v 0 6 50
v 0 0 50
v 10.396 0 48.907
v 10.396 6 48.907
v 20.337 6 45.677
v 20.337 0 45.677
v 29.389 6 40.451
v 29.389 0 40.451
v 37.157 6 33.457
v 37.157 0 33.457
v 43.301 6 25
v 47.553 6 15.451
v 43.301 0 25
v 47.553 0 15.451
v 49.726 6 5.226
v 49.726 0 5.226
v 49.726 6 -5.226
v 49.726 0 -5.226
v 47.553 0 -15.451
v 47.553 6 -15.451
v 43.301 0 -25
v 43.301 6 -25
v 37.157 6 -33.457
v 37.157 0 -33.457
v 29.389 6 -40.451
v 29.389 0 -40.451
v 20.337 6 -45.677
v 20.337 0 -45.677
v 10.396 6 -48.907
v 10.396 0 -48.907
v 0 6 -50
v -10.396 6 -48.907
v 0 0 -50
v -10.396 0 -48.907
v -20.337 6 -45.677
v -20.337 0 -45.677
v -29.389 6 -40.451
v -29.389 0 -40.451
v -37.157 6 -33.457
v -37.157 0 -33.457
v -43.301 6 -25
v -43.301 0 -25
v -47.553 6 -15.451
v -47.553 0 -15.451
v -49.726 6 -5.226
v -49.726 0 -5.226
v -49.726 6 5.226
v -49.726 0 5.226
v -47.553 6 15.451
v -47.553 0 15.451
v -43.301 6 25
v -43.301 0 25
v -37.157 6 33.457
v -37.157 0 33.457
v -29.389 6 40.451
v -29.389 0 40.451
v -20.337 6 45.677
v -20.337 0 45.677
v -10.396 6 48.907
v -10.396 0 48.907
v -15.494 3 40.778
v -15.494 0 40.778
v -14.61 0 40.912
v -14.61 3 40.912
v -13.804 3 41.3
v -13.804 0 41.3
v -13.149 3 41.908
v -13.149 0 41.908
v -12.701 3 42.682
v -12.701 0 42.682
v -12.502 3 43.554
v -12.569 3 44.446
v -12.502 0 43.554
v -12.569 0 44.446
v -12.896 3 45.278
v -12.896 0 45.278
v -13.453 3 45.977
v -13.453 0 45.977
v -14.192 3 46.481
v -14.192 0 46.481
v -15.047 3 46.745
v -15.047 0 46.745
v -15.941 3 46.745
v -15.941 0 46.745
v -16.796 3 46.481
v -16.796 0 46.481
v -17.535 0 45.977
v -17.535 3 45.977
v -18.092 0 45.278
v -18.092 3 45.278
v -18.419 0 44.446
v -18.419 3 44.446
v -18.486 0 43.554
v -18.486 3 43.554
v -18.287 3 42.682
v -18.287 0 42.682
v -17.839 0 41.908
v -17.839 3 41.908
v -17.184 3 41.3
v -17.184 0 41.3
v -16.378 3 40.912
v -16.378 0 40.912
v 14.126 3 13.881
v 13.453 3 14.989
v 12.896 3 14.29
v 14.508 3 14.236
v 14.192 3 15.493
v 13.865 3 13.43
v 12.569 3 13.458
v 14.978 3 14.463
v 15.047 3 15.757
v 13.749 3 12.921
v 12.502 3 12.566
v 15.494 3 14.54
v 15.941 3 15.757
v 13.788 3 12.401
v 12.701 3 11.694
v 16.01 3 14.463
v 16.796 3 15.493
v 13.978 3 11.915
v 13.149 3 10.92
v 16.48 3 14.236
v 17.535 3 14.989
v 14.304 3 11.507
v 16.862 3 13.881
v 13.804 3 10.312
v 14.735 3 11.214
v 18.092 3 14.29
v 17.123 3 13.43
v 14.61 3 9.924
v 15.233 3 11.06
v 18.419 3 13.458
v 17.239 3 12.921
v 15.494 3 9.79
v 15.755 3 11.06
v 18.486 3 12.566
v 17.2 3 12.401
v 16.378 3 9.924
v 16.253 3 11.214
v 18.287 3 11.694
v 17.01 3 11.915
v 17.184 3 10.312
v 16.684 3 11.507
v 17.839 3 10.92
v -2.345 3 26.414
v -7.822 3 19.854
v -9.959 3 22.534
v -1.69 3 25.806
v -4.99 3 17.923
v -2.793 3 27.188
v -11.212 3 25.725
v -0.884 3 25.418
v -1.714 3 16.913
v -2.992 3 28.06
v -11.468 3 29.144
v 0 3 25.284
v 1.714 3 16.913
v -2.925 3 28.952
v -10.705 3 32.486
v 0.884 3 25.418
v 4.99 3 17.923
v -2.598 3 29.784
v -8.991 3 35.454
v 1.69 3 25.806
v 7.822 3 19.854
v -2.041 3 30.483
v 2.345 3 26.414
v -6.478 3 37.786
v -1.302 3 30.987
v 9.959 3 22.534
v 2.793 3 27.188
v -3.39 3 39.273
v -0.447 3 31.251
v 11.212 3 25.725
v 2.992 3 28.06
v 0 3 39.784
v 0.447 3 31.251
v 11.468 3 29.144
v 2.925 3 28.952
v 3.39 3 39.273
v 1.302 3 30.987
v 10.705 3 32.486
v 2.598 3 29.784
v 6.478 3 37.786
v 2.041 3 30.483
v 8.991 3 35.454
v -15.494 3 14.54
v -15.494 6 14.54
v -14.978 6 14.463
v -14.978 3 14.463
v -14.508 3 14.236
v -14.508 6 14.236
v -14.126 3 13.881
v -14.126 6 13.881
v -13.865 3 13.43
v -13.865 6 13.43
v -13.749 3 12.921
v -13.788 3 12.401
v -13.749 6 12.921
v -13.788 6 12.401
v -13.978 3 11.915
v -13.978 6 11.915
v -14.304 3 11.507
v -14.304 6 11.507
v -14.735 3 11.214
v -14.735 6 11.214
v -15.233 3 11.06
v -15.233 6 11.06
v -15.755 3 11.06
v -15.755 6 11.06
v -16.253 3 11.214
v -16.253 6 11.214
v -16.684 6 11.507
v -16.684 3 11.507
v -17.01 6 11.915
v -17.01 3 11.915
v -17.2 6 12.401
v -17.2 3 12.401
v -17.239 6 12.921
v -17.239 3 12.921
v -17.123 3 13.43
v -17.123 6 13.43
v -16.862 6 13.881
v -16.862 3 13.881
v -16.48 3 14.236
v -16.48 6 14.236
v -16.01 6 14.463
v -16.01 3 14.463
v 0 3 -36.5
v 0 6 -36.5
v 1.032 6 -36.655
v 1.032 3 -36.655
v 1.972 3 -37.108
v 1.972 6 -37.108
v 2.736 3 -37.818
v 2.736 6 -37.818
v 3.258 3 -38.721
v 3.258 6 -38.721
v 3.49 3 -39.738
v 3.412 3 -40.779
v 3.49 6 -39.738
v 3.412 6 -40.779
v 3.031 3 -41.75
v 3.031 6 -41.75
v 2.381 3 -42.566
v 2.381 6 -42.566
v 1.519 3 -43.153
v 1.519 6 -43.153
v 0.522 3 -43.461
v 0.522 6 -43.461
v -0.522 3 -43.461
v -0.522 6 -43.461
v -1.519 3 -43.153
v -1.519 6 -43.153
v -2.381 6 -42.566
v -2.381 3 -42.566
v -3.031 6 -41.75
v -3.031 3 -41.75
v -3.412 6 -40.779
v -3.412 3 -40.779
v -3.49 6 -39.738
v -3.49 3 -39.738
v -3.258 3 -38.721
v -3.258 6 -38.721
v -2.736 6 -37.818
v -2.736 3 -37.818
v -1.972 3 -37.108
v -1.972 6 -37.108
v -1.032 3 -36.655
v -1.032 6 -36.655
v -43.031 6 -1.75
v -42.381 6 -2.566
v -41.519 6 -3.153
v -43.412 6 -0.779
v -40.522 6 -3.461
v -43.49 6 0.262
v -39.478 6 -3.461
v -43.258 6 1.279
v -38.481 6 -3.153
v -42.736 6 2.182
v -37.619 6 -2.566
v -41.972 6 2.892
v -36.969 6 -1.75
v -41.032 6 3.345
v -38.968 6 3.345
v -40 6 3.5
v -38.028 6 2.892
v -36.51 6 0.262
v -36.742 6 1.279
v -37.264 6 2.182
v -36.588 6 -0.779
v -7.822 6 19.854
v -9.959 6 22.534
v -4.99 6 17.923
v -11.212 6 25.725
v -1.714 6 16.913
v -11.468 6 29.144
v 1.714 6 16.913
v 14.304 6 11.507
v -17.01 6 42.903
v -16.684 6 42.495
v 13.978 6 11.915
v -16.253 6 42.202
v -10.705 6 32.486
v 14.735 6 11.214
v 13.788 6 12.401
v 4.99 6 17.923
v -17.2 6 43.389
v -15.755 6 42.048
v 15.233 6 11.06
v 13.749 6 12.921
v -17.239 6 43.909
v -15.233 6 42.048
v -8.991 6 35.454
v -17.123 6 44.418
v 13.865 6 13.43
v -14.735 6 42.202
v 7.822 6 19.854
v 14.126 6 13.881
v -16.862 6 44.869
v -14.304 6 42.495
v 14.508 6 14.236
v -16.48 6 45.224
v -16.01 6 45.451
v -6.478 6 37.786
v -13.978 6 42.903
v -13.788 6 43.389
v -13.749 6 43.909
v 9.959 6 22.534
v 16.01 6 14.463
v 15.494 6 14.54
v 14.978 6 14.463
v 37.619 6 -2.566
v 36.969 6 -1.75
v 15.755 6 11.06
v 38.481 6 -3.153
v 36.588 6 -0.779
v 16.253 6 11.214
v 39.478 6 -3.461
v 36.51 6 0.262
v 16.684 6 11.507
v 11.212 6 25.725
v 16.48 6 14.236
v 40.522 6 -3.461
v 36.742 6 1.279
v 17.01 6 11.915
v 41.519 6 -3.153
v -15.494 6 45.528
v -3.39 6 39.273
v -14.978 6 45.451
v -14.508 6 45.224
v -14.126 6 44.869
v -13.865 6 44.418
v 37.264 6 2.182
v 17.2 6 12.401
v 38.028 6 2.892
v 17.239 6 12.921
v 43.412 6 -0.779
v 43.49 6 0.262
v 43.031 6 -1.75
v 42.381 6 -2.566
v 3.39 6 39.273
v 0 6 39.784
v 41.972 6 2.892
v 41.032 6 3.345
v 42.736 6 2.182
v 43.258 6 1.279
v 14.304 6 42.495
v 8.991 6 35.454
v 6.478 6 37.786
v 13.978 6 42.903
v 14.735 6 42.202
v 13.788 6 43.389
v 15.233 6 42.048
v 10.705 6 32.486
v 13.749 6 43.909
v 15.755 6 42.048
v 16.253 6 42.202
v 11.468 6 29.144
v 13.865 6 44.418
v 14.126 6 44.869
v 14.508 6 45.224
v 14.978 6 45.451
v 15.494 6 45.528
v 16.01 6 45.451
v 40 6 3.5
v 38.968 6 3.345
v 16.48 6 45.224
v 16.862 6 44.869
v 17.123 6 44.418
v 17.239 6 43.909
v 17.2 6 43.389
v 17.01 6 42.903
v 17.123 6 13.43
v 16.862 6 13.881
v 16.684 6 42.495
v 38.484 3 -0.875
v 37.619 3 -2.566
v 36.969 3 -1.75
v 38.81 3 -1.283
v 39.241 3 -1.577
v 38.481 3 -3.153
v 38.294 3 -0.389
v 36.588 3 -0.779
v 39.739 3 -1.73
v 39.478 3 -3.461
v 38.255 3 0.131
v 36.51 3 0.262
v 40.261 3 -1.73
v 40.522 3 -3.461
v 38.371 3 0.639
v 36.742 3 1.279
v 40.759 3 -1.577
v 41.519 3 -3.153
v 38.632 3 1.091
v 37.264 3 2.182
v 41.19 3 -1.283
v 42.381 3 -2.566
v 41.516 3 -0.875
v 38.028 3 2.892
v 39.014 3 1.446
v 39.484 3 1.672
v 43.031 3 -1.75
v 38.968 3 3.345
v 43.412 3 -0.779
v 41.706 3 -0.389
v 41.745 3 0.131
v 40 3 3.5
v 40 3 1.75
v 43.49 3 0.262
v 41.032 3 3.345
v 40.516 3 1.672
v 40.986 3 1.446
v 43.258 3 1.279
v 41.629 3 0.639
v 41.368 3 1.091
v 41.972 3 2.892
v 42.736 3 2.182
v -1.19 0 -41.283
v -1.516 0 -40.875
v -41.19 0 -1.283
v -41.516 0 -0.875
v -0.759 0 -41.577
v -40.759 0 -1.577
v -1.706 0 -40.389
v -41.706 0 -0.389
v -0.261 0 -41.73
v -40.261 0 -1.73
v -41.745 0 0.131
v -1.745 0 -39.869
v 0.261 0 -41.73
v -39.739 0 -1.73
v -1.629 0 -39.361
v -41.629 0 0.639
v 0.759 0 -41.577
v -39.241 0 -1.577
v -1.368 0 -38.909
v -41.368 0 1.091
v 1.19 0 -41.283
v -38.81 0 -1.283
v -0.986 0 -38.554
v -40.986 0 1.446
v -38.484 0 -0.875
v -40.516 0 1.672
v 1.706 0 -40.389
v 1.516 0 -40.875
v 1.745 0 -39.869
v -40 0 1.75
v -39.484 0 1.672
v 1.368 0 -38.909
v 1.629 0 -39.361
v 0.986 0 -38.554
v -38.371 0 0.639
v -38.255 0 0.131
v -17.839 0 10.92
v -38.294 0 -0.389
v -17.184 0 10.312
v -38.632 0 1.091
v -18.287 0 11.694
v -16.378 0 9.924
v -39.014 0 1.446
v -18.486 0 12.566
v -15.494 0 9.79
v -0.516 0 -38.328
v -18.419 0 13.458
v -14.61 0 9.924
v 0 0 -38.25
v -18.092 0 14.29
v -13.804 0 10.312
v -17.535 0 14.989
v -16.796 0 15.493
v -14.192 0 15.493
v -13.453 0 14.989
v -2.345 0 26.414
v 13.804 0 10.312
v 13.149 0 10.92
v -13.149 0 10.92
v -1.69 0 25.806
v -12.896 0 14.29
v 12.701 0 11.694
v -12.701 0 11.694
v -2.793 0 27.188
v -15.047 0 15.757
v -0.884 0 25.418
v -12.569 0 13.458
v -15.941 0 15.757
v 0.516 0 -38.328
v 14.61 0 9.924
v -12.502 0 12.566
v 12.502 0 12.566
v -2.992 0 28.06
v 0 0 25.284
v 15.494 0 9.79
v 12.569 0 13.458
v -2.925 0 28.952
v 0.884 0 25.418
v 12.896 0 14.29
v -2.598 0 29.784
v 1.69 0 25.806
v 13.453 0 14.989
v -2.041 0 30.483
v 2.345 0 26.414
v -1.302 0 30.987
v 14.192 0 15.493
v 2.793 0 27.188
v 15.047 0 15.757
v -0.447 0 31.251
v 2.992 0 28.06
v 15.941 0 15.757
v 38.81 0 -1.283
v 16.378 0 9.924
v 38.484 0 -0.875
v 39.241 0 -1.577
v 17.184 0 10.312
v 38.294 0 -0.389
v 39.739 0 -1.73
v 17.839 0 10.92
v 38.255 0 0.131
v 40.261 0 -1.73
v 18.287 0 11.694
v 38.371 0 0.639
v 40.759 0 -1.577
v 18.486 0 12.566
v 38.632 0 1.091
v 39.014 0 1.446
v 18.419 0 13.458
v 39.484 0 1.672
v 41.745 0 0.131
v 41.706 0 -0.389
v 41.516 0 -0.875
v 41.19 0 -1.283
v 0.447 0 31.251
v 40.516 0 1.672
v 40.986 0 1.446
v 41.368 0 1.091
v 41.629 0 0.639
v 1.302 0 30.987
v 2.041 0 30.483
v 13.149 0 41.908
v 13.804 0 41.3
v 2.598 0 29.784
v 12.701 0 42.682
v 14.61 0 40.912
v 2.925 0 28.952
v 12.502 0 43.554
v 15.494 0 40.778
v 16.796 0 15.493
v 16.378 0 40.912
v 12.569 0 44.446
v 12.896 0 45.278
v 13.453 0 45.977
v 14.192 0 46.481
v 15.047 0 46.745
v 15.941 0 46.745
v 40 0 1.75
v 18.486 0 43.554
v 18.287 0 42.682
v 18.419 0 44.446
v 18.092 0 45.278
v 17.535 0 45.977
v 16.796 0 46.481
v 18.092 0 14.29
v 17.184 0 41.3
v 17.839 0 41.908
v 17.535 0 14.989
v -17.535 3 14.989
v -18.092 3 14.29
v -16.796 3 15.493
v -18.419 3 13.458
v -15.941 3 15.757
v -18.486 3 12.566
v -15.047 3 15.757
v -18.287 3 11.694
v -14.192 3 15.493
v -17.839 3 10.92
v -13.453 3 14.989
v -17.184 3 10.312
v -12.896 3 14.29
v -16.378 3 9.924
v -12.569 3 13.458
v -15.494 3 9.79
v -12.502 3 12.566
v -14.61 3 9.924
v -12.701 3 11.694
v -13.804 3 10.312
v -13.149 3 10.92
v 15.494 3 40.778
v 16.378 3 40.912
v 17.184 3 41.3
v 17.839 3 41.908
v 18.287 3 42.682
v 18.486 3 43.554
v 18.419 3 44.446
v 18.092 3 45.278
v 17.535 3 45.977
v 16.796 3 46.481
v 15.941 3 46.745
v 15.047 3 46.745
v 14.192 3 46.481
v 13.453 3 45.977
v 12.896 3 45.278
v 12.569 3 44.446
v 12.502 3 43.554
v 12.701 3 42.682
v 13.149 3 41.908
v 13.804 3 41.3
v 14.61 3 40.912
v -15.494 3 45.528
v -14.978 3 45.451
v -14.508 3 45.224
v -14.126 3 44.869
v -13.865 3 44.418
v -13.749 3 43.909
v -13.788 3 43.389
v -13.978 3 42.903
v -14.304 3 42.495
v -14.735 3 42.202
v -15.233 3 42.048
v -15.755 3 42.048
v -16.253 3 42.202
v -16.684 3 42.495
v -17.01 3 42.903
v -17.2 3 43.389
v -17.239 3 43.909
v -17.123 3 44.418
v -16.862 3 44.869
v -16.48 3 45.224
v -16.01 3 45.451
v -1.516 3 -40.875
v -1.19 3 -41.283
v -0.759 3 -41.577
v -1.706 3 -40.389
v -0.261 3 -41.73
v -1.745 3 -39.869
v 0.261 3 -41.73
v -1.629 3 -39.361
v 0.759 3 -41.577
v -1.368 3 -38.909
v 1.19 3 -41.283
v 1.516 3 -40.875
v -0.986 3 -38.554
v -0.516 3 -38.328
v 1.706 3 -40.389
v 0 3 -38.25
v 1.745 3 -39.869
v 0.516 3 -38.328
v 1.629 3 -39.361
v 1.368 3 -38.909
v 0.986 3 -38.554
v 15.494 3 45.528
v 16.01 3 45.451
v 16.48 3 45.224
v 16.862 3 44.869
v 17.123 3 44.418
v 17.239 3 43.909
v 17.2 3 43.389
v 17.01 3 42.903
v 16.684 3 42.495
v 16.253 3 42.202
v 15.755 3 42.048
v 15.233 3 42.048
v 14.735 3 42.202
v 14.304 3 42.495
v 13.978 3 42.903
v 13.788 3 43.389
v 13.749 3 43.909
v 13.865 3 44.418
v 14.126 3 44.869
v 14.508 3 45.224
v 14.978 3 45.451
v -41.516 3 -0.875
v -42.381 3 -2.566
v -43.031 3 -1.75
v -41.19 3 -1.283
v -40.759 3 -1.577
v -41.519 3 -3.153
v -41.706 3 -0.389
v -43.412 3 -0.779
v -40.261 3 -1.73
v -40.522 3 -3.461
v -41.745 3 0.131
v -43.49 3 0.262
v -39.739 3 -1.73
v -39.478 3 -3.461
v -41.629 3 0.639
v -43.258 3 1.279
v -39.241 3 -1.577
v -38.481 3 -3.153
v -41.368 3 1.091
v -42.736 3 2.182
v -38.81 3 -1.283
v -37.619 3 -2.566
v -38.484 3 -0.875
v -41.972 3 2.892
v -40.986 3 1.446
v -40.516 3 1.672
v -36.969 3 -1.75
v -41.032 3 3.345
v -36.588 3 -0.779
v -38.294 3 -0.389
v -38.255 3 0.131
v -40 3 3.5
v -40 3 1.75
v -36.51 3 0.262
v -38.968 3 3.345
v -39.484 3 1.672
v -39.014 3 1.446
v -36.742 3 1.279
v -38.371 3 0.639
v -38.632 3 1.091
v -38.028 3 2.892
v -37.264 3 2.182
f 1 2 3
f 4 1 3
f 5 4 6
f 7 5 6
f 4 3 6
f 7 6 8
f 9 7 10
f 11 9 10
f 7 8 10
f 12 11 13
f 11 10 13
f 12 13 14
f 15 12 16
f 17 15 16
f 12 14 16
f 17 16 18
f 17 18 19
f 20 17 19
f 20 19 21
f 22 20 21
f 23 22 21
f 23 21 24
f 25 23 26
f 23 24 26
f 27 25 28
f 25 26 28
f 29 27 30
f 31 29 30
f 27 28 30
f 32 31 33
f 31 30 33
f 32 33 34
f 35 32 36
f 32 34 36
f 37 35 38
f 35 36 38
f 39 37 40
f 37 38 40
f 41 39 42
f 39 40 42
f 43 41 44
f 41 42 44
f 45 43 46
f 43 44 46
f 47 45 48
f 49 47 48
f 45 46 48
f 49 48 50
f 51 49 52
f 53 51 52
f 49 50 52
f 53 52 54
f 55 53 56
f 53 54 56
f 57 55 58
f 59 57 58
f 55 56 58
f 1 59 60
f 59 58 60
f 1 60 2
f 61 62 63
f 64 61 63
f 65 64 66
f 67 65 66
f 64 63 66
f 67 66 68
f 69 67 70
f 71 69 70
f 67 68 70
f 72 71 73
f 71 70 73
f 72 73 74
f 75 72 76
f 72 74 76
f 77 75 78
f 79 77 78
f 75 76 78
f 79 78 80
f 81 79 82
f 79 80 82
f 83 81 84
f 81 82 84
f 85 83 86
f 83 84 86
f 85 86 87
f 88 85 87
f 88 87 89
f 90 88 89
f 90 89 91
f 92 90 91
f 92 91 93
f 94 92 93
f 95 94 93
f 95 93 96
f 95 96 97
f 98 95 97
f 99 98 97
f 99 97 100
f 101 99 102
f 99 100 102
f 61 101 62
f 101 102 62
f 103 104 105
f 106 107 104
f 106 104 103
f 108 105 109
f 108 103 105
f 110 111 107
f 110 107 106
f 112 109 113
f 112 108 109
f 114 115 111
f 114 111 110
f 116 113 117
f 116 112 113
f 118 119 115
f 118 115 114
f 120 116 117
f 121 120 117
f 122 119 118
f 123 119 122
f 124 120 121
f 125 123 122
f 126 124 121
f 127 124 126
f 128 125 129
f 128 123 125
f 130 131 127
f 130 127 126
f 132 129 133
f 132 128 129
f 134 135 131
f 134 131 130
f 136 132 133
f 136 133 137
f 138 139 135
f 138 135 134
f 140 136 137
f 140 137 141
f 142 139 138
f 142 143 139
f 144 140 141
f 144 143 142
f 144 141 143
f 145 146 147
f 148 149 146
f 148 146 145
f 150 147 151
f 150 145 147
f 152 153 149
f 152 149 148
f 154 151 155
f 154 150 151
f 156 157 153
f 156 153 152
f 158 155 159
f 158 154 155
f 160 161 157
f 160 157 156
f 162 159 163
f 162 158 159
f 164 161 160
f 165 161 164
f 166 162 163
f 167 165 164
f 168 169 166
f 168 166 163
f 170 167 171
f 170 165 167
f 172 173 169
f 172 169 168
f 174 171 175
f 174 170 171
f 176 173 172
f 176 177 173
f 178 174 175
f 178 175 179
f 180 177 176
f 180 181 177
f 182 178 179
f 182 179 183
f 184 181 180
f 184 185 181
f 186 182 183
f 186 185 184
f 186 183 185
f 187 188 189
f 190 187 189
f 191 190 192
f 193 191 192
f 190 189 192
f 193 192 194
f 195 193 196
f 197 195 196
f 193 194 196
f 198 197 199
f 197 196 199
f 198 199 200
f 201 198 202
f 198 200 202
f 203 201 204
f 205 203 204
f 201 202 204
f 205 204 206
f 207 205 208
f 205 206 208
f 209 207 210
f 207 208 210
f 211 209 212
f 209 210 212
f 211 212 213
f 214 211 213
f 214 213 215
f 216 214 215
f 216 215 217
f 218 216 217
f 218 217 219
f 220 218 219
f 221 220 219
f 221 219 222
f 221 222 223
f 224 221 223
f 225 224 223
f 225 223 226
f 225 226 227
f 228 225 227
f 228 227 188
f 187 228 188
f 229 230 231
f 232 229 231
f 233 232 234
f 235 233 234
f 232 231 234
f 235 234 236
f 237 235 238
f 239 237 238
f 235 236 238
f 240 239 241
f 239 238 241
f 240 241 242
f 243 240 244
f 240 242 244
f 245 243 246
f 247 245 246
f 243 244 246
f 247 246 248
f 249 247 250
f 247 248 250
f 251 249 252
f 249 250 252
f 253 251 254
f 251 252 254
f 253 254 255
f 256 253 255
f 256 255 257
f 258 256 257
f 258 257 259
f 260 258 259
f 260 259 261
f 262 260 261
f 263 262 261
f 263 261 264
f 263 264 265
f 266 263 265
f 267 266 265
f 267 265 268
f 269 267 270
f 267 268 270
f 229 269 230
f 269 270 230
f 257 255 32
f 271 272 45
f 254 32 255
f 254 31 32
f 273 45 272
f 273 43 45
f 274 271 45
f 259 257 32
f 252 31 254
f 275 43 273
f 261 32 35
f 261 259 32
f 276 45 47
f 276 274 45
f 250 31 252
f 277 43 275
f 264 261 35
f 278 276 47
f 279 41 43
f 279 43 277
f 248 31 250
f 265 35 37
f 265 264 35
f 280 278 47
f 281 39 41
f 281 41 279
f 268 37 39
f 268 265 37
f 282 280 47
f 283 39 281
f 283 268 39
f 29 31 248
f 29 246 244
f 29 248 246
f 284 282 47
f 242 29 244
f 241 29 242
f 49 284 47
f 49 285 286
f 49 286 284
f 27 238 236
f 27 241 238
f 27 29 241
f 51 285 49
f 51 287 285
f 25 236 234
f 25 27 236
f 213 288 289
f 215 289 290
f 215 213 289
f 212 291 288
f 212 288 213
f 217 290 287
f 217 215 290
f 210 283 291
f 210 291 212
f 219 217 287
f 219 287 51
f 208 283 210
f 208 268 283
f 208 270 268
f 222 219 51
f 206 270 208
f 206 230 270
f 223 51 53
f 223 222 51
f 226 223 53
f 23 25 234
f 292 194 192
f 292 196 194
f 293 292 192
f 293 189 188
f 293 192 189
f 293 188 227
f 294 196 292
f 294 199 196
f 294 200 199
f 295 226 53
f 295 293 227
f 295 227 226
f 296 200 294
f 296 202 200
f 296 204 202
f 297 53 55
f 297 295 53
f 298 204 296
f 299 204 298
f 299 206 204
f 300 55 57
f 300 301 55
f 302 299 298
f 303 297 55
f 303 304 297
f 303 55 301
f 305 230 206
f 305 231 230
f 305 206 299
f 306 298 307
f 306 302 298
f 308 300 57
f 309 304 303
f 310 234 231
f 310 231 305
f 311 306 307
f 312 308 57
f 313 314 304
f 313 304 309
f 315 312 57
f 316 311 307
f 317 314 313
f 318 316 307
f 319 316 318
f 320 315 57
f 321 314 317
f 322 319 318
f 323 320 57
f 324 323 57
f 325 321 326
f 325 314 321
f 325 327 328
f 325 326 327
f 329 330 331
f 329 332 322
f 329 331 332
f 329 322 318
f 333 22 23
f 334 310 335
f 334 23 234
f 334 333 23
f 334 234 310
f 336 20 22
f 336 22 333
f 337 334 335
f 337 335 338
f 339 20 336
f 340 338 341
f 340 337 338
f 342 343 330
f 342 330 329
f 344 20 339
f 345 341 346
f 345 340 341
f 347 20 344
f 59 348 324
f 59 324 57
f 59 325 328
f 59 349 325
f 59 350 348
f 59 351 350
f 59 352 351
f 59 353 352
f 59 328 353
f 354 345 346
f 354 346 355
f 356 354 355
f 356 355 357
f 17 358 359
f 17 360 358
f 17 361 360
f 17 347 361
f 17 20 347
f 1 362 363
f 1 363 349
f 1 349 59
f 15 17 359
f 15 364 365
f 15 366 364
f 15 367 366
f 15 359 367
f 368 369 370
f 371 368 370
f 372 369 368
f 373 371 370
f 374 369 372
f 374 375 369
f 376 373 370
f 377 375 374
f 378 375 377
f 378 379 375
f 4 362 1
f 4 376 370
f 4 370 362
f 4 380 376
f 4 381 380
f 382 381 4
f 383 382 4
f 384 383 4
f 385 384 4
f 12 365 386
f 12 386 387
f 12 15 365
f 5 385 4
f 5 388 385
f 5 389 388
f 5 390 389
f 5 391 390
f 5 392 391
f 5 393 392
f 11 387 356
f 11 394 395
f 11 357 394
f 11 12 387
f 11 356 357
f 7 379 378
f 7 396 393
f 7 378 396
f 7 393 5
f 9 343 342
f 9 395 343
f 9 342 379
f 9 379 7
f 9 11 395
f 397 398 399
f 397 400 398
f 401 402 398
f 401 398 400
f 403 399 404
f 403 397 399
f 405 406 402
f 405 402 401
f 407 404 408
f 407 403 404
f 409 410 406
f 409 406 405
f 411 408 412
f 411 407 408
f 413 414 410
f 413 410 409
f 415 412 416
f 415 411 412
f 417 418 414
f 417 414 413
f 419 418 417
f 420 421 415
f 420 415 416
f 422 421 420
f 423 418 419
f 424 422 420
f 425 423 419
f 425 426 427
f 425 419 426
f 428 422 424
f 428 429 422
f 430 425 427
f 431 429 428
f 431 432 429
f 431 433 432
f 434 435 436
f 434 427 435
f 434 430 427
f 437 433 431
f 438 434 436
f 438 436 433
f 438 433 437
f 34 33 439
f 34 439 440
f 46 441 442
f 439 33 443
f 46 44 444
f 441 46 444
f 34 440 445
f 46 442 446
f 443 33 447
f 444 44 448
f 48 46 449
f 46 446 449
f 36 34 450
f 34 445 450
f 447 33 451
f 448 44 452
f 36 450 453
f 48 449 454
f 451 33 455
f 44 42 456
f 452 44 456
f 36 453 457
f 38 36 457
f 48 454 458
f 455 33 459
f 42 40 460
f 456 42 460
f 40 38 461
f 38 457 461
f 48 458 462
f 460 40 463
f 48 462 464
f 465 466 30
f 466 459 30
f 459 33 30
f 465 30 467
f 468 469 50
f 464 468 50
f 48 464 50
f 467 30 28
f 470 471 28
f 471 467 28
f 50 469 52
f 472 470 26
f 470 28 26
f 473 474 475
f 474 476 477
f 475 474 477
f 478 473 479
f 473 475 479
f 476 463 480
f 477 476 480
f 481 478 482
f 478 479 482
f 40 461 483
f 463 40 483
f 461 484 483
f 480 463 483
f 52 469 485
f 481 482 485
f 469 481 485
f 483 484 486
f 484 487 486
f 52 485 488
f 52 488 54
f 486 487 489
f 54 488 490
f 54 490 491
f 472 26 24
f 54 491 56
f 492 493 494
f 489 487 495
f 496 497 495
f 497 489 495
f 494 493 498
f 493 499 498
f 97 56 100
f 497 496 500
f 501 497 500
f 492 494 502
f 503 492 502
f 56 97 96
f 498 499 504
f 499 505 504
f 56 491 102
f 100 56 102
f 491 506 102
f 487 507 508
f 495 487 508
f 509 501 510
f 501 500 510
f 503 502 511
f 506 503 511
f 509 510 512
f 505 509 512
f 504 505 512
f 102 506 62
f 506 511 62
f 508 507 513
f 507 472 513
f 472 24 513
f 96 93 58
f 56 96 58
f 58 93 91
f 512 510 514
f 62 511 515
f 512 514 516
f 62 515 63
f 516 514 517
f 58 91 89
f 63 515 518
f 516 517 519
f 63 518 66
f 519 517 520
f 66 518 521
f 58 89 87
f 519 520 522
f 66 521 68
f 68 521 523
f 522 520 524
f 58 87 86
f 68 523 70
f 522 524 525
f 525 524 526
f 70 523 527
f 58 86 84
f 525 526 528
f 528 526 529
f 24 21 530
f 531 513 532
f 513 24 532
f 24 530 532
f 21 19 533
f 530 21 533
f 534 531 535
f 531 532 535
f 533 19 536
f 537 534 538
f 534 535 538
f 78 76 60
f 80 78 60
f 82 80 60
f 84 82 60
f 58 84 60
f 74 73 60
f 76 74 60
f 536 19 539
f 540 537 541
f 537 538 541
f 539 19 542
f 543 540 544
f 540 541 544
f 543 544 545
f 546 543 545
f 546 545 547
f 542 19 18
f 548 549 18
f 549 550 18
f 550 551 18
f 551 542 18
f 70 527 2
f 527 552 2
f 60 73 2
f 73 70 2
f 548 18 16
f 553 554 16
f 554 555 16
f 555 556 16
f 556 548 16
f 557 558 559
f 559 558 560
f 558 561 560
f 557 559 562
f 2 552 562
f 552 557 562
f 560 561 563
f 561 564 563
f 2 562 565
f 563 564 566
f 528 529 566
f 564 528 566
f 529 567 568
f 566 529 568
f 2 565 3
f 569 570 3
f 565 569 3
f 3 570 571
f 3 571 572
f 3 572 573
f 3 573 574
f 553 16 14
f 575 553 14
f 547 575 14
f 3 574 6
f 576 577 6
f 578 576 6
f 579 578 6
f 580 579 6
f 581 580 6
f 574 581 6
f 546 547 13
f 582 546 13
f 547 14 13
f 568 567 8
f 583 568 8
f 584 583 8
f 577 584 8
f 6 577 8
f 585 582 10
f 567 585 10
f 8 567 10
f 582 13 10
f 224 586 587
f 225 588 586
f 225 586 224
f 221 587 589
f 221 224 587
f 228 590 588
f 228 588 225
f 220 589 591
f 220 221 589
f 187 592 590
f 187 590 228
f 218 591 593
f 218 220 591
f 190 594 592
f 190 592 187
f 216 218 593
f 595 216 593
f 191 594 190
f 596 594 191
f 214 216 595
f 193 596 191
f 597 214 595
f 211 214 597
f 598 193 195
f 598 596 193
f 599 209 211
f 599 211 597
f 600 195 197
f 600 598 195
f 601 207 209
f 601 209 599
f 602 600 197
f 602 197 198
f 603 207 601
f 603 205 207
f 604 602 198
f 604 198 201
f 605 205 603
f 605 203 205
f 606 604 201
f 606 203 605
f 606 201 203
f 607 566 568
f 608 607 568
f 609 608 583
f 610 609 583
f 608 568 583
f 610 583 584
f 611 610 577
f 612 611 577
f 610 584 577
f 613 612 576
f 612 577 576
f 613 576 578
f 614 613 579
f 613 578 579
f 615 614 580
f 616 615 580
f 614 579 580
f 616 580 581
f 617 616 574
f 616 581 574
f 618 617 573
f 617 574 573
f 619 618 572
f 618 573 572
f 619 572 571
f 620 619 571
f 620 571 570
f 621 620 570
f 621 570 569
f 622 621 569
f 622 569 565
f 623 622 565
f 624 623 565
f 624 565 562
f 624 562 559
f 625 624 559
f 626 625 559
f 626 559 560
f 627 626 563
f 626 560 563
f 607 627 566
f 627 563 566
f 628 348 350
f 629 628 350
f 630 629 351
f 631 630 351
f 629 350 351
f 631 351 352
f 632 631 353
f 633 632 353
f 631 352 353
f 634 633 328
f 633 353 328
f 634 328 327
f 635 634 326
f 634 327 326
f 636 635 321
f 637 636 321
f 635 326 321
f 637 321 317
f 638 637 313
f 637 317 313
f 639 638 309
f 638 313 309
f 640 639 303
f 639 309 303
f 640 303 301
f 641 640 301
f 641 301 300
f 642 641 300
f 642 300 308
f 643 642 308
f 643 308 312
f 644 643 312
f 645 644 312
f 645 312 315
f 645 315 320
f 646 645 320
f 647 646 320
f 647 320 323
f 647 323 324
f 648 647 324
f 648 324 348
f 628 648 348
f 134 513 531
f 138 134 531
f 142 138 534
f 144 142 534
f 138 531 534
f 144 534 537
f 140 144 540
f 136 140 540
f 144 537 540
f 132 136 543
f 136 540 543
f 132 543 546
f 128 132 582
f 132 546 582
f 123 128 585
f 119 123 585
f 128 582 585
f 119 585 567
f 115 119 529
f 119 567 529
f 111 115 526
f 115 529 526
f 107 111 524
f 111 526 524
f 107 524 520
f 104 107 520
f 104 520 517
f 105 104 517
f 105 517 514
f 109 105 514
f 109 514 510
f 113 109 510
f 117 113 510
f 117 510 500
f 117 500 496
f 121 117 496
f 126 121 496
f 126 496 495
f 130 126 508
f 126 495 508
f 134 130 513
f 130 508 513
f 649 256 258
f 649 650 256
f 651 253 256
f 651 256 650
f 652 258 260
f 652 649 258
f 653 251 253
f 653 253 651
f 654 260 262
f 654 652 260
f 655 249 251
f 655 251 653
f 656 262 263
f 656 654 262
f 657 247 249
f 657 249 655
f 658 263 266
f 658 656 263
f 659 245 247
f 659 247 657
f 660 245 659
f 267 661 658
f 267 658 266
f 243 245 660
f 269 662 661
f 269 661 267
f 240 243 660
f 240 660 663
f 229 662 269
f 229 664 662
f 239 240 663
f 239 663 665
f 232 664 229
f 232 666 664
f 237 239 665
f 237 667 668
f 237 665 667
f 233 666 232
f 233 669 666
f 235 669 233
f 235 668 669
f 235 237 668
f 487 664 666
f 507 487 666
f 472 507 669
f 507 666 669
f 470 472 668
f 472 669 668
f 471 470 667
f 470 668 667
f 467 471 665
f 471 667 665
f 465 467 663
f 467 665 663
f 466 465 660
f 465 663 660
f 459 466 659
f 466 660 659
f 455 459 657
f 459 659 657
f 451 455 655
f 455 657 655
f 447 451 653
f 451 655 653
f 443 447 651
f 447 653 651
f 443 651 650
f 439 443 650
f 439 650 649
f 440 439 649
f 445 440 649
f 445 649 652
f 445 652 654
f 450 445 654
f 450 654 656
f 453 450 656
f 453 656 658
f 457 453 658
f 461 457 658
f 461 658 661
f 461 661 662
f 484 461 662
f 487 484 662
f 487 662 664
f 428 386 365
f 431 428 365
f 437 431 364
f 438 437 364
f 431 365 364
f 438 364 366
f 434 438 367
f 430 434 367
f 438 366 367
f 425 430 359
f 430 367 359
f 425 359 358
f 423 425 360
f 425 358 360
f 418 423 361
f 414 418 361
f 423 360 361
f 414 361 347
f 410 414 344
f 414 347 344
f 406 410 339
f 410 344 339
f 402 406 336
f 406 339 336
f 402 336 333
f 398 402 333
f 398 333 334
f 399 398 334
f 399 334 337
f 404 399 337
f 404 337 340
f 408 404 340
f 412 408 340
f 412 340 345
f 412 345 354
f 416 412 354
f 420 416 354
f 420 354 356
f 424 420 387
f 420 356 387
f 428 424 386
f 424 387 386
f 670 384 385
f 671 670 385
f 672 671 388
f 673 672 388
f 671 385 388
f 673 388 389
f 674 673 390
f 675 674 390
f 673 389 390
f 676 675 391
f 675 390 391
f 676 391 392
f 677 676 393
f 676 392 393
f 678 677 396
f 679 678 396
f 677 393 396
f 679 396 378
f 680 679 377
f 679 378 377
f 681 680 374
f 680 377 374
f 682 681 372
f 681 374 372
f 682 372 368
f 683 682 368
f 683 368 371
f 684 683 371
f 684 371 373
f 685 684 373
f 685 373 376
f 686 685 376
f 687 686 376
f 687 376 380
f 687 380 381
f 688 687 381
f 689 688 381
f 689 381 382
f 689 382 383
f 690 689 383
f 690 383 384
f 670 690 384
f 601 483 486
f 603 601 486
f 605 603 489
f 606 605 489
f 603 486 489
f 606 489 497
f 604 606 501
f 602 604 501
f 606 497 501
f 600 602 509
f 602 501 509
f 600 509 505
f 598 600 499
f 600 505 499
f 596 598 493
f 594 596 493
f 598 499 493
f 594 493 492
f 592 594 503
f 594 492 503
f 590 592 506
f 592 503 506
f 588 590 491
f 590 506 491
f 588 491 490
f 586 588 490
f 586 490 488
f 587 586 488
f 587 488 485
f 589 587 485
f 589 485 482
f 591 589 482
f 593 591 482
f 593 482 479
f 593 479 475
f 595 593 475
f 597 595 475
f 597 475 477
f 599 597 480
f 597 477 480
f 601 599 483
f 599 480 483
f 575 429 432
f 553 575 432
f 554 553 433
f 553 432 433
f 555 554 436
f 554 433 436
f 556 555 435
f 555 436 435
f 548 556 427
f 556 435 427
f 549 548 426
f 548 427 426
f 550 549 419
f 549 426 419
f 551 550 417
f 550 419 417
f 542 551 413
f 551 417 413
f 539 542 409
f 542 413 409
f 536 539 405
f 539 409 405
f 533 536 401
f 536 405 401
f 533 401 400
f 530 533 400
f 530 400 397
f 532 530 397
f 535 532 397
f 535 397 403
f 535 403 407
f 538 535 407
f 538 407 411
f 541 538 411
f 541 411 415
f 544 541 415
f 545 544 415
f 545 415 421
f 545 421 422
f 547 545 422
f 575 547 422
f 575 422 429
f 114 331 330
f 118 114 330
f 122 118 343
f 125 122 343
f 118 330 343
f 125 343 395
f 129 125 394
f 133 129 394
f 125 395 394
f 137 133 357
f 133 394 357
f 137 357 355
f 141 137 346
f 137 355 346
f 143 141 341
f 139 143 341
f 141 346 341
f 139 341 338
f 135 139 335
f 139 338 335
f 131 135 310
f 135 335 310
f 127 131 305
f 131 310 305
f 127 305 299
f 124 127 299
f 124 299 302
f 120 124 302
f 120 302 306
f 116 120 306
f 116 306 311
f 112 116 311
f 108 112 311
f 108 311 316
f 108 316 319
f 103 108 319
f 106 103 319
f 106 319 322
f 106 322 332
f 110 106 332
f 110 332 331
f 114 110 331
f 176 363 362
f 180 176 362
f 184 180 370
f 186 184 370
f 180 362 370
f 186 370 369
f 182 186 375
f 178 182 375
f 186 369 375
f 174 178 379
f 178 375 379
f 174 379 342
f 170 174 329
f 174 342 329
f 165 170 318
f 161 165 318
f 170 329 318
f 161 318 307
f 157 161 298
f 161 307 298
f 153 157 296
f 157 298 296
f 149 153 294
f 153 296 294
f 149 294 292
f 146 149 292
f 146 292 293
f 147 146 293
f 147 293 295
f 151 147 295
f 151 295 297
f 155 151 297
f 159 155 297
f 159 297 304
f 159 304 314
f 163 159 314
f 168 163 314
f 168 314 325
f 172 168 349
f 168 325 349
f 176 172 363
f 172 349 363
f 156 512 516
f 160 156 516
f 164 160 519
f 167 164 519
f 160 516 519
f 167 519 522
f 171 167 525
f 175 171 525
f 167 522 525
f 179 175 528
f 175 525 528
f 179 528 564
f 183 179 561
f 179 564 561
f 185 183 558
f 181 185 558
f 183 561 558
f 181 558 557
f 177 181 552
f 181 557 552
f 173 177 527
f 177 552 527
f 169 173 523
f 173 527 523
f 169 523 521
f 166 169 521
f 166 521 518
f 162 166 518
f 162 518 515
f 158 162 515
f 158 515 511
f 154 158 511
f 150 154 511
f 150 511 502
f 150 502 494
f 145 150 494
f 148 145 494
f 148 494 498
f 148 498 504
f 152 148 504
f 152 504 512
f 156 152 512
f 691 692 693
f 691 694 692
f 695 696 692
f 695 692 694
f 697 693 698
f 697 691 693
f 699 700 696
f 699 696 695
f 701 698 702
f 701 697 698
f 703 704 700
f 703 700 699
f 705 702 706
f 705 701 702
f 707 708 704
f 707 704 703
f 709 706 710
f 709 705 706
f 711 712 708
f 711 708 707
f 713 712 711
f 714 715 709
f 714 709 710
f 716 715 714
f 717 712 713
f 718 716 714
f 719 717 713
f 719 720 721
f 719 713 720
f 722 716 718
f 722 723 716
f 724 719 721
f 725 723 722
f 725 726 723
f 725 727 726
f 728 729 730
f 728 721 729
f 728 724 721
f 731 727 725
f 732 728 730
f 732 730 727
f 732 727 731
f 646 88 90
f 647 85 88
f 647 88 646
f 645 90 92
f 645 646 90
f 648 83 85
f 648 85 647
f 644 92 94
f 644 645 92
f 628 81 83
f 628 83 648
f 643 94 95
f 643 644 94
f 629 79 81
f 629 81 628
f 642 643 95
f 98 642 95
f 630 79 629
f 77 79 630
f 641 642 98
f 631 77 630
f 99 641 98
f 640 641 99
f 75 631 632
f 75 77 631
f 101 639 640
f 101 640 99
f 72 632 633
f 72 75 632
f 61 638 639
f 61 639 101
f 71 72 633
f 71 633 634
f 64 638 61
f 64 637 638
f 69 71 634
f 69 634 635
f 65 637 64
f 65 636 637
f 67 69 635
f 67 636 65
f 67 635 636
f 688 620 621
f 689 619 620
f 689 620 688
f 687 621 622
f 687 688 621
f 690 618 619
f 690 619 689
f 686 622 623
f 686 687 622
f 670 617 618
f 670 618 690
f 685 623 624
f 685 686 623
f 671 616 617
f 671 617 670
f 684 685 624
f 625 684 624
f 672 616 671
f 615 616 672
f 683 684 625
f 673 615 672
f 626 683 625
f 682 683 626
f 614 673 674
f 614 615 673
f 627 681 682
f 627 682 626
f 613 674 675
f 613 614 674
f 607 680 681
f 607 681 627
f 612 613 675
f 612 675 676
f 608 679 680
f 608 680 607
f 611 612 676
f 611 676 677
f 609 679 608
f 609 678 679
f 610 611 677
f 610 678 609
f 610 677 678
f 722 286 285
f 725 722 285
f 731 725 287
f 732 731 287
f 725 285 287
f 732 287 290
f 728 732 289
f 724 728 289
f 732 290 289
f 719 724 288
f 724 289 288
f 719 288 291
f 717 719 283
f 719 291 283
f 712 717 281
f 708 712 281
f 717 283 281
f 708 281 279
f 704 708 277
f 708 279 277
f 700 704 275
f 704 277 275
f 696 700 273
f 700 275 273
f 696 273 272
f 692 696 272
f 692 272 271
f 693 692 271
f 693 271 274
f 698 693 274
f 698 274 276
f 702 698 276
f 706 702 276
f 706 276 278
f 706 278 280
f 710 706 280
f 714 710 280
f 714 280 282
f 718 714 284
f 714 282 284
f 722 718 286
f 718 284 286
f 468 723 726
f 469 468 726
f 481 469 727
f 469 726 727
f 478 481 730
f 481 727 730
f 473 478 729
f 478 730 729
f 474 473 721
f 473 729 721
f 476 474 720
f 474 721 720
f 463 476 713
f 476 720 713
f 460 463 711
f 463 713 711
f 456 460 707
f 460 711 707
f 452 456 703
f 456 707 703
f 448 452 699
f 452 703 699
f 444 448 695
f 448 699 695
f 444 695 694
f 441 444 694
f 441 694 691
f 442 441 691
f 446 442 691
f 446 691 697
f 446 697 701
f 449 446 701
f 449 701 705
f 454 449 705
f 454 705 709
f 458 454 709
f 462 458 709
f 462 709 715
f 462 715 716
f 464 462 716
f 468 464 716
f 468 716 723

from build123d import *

# Parameters (mm, degrees)
SKETCH_1_R          = 50
EXTRUDE_1_DEPTH     = 6
SKETCH_2_R          = 1.75
CUT_EXTRUDE_1_DEPTH = 24
SKETCH_4_R          = 3
CUT_EXTRUDE_2_DEPTH = 24
SKETCH_5_R          = 11.5
CUT_EXTRUDE_3_DEPTH = 3
SKETCH_6_R          = 1.75
CUT_EXTRUDE_4_DEPTH = 37
SKETCH_7_R          = 3
CUT_EXTRUDE_5_DEPTH = 3
SKETCH_8_R          = 3.5
CUT_EXTRUDE_6_DEPTH = 3


with BuildPart() as part:
    # 草图1 → 凸台-拉伸1 (new body)
    with BuildSketch(Plane(origin=(0, 0, 0), x_dir=(1, 0, 0), z_dir=(0, 1, 0))):
        with Locations(Location((0, 0, 0), (0, 0, 270))):
            Circle(SKETCH_1_R)
    extrude(amount=EXTRUDE_1_DEPTH)

    # 草图2 → 切除-拉伸1 (cut)
    with BuildSketch(Plane(origin=(0, 6, 0), x_dir=(1, 0, 0), z_dir=(0, 1, 0))):
        with Locations(Location((0, 40, 0), (0, 0, 270))):
            Circle(SKETCH_2_R)
        with Locations(Location((40, 0, 0), (0, 0, 270))):
            Circle(SKETCH_2_R)
        with Locations(Location((-40, 0, 0), (0, 0, 270))):
            Circle(SKETCH_2_R)
    extrude(amount=-CUT_EXTRUDE_1_DEPTH, mode=Mode.SUBTRACT)

    # 草图4 → 切除-拉伸2 (cut)
    with BuildSketch(Plane.XZ):
        with Locations(Location((0, 28.284271247, 0), (0, 0, 270))):
            Circle(SKETCH_4_R)
    extrude(amount=-CUT_EXTRUDE_2_DEPTH, mode=Mode.SUBTRACT)

    # 草图5 → 切除-拉伸3 (cut)
    with BuildSketch(Plane(origin=(0, 6, 0), x_dir=(1, 0, 0), z_dir=(0, 1, 0))):
        with Locations(Location((0, -28.284271247, 0), (0, 0, 270))):
            Circle(SKETCH_5_R)
    extrude(amount=-CUT_EXTRUDE_3_DEPTH, mode=Mode.SUBTRACT)

    # 草图6 → 切除-拉伸4 (cut)
    with BuildSketch(Plane(origin=(0, 6, 0), x_dir=(1, 0, 0), z_dir=(0, 1, 0))):
        with Locations(Location((15.494, -12.790271247, 0), (0, 0, 270))):
            Circle(SKETCH_6_R)
        with Locations(Location((15.494, -43.778271247, 0), (0, 0, 270))):
            Circle(SKETCH_6_R)
        with Locations(Location((-15.494, -43.778271247, 0), (0, 0, 270))):
            Circle(SKETCH_6_R)
        with Locations(Location((-15.494, -12.790271247, 0), (0, 0, 270))):
            Circle(SKETCH_6_R)
    extrude(amount=-CUT_EXTRUDE_4_DEPTH, mode=Mode.SUBTRACT)

    # 草图7 → 切除-拉伸5 (cut)
    with BuildSketch(Plane.XZ):
        with Locations(Location((15.494, 43.778271247, 0), (0, 0, 270))):
            Circle(SKETCH_7_R)
        with Locations(Location((15.494, 12.790271247, 0), (0, 0, 270))):
            Circle(SKETCH_7_R)
        with Locations(Location((-15.494, 12.790271247, 0), (0, 0, 270))):
            Circle(SKETCH_7_R)
        with Locations(Location((-15.494, 43.778271247, 0), (0, 0, 270))):
            Circle(SKETCH_7_R)
    extrude(amount=-CUT_EXTRUDE_5_DEPTH, mode=Mode.SUBTRACT)

    # 草图8 → 切除-拉伸6 (cut)
    with BuildSketch(Plane(origin=(0, 6, 0), x_dir=(1, 0, 0), z_dir=(0, 1, 0))):
        with Locations(Location((0, 40, 0), (0, 0, 270))):
            Circle(SKETCH_8_R)
        with Locations(Location((-40, 0, 0), (0, 0, 270))):
            Circle(SKETCH_8_R)
        with Locations(Location((40, 0, 0), (0, 0, 270))):
            Circle(SKETCH_8_R)
    extrude(amount=-CUT_EXTRUDE_6_DEPTH, mode=Mode.SUBTRACT)


solid = part.part
